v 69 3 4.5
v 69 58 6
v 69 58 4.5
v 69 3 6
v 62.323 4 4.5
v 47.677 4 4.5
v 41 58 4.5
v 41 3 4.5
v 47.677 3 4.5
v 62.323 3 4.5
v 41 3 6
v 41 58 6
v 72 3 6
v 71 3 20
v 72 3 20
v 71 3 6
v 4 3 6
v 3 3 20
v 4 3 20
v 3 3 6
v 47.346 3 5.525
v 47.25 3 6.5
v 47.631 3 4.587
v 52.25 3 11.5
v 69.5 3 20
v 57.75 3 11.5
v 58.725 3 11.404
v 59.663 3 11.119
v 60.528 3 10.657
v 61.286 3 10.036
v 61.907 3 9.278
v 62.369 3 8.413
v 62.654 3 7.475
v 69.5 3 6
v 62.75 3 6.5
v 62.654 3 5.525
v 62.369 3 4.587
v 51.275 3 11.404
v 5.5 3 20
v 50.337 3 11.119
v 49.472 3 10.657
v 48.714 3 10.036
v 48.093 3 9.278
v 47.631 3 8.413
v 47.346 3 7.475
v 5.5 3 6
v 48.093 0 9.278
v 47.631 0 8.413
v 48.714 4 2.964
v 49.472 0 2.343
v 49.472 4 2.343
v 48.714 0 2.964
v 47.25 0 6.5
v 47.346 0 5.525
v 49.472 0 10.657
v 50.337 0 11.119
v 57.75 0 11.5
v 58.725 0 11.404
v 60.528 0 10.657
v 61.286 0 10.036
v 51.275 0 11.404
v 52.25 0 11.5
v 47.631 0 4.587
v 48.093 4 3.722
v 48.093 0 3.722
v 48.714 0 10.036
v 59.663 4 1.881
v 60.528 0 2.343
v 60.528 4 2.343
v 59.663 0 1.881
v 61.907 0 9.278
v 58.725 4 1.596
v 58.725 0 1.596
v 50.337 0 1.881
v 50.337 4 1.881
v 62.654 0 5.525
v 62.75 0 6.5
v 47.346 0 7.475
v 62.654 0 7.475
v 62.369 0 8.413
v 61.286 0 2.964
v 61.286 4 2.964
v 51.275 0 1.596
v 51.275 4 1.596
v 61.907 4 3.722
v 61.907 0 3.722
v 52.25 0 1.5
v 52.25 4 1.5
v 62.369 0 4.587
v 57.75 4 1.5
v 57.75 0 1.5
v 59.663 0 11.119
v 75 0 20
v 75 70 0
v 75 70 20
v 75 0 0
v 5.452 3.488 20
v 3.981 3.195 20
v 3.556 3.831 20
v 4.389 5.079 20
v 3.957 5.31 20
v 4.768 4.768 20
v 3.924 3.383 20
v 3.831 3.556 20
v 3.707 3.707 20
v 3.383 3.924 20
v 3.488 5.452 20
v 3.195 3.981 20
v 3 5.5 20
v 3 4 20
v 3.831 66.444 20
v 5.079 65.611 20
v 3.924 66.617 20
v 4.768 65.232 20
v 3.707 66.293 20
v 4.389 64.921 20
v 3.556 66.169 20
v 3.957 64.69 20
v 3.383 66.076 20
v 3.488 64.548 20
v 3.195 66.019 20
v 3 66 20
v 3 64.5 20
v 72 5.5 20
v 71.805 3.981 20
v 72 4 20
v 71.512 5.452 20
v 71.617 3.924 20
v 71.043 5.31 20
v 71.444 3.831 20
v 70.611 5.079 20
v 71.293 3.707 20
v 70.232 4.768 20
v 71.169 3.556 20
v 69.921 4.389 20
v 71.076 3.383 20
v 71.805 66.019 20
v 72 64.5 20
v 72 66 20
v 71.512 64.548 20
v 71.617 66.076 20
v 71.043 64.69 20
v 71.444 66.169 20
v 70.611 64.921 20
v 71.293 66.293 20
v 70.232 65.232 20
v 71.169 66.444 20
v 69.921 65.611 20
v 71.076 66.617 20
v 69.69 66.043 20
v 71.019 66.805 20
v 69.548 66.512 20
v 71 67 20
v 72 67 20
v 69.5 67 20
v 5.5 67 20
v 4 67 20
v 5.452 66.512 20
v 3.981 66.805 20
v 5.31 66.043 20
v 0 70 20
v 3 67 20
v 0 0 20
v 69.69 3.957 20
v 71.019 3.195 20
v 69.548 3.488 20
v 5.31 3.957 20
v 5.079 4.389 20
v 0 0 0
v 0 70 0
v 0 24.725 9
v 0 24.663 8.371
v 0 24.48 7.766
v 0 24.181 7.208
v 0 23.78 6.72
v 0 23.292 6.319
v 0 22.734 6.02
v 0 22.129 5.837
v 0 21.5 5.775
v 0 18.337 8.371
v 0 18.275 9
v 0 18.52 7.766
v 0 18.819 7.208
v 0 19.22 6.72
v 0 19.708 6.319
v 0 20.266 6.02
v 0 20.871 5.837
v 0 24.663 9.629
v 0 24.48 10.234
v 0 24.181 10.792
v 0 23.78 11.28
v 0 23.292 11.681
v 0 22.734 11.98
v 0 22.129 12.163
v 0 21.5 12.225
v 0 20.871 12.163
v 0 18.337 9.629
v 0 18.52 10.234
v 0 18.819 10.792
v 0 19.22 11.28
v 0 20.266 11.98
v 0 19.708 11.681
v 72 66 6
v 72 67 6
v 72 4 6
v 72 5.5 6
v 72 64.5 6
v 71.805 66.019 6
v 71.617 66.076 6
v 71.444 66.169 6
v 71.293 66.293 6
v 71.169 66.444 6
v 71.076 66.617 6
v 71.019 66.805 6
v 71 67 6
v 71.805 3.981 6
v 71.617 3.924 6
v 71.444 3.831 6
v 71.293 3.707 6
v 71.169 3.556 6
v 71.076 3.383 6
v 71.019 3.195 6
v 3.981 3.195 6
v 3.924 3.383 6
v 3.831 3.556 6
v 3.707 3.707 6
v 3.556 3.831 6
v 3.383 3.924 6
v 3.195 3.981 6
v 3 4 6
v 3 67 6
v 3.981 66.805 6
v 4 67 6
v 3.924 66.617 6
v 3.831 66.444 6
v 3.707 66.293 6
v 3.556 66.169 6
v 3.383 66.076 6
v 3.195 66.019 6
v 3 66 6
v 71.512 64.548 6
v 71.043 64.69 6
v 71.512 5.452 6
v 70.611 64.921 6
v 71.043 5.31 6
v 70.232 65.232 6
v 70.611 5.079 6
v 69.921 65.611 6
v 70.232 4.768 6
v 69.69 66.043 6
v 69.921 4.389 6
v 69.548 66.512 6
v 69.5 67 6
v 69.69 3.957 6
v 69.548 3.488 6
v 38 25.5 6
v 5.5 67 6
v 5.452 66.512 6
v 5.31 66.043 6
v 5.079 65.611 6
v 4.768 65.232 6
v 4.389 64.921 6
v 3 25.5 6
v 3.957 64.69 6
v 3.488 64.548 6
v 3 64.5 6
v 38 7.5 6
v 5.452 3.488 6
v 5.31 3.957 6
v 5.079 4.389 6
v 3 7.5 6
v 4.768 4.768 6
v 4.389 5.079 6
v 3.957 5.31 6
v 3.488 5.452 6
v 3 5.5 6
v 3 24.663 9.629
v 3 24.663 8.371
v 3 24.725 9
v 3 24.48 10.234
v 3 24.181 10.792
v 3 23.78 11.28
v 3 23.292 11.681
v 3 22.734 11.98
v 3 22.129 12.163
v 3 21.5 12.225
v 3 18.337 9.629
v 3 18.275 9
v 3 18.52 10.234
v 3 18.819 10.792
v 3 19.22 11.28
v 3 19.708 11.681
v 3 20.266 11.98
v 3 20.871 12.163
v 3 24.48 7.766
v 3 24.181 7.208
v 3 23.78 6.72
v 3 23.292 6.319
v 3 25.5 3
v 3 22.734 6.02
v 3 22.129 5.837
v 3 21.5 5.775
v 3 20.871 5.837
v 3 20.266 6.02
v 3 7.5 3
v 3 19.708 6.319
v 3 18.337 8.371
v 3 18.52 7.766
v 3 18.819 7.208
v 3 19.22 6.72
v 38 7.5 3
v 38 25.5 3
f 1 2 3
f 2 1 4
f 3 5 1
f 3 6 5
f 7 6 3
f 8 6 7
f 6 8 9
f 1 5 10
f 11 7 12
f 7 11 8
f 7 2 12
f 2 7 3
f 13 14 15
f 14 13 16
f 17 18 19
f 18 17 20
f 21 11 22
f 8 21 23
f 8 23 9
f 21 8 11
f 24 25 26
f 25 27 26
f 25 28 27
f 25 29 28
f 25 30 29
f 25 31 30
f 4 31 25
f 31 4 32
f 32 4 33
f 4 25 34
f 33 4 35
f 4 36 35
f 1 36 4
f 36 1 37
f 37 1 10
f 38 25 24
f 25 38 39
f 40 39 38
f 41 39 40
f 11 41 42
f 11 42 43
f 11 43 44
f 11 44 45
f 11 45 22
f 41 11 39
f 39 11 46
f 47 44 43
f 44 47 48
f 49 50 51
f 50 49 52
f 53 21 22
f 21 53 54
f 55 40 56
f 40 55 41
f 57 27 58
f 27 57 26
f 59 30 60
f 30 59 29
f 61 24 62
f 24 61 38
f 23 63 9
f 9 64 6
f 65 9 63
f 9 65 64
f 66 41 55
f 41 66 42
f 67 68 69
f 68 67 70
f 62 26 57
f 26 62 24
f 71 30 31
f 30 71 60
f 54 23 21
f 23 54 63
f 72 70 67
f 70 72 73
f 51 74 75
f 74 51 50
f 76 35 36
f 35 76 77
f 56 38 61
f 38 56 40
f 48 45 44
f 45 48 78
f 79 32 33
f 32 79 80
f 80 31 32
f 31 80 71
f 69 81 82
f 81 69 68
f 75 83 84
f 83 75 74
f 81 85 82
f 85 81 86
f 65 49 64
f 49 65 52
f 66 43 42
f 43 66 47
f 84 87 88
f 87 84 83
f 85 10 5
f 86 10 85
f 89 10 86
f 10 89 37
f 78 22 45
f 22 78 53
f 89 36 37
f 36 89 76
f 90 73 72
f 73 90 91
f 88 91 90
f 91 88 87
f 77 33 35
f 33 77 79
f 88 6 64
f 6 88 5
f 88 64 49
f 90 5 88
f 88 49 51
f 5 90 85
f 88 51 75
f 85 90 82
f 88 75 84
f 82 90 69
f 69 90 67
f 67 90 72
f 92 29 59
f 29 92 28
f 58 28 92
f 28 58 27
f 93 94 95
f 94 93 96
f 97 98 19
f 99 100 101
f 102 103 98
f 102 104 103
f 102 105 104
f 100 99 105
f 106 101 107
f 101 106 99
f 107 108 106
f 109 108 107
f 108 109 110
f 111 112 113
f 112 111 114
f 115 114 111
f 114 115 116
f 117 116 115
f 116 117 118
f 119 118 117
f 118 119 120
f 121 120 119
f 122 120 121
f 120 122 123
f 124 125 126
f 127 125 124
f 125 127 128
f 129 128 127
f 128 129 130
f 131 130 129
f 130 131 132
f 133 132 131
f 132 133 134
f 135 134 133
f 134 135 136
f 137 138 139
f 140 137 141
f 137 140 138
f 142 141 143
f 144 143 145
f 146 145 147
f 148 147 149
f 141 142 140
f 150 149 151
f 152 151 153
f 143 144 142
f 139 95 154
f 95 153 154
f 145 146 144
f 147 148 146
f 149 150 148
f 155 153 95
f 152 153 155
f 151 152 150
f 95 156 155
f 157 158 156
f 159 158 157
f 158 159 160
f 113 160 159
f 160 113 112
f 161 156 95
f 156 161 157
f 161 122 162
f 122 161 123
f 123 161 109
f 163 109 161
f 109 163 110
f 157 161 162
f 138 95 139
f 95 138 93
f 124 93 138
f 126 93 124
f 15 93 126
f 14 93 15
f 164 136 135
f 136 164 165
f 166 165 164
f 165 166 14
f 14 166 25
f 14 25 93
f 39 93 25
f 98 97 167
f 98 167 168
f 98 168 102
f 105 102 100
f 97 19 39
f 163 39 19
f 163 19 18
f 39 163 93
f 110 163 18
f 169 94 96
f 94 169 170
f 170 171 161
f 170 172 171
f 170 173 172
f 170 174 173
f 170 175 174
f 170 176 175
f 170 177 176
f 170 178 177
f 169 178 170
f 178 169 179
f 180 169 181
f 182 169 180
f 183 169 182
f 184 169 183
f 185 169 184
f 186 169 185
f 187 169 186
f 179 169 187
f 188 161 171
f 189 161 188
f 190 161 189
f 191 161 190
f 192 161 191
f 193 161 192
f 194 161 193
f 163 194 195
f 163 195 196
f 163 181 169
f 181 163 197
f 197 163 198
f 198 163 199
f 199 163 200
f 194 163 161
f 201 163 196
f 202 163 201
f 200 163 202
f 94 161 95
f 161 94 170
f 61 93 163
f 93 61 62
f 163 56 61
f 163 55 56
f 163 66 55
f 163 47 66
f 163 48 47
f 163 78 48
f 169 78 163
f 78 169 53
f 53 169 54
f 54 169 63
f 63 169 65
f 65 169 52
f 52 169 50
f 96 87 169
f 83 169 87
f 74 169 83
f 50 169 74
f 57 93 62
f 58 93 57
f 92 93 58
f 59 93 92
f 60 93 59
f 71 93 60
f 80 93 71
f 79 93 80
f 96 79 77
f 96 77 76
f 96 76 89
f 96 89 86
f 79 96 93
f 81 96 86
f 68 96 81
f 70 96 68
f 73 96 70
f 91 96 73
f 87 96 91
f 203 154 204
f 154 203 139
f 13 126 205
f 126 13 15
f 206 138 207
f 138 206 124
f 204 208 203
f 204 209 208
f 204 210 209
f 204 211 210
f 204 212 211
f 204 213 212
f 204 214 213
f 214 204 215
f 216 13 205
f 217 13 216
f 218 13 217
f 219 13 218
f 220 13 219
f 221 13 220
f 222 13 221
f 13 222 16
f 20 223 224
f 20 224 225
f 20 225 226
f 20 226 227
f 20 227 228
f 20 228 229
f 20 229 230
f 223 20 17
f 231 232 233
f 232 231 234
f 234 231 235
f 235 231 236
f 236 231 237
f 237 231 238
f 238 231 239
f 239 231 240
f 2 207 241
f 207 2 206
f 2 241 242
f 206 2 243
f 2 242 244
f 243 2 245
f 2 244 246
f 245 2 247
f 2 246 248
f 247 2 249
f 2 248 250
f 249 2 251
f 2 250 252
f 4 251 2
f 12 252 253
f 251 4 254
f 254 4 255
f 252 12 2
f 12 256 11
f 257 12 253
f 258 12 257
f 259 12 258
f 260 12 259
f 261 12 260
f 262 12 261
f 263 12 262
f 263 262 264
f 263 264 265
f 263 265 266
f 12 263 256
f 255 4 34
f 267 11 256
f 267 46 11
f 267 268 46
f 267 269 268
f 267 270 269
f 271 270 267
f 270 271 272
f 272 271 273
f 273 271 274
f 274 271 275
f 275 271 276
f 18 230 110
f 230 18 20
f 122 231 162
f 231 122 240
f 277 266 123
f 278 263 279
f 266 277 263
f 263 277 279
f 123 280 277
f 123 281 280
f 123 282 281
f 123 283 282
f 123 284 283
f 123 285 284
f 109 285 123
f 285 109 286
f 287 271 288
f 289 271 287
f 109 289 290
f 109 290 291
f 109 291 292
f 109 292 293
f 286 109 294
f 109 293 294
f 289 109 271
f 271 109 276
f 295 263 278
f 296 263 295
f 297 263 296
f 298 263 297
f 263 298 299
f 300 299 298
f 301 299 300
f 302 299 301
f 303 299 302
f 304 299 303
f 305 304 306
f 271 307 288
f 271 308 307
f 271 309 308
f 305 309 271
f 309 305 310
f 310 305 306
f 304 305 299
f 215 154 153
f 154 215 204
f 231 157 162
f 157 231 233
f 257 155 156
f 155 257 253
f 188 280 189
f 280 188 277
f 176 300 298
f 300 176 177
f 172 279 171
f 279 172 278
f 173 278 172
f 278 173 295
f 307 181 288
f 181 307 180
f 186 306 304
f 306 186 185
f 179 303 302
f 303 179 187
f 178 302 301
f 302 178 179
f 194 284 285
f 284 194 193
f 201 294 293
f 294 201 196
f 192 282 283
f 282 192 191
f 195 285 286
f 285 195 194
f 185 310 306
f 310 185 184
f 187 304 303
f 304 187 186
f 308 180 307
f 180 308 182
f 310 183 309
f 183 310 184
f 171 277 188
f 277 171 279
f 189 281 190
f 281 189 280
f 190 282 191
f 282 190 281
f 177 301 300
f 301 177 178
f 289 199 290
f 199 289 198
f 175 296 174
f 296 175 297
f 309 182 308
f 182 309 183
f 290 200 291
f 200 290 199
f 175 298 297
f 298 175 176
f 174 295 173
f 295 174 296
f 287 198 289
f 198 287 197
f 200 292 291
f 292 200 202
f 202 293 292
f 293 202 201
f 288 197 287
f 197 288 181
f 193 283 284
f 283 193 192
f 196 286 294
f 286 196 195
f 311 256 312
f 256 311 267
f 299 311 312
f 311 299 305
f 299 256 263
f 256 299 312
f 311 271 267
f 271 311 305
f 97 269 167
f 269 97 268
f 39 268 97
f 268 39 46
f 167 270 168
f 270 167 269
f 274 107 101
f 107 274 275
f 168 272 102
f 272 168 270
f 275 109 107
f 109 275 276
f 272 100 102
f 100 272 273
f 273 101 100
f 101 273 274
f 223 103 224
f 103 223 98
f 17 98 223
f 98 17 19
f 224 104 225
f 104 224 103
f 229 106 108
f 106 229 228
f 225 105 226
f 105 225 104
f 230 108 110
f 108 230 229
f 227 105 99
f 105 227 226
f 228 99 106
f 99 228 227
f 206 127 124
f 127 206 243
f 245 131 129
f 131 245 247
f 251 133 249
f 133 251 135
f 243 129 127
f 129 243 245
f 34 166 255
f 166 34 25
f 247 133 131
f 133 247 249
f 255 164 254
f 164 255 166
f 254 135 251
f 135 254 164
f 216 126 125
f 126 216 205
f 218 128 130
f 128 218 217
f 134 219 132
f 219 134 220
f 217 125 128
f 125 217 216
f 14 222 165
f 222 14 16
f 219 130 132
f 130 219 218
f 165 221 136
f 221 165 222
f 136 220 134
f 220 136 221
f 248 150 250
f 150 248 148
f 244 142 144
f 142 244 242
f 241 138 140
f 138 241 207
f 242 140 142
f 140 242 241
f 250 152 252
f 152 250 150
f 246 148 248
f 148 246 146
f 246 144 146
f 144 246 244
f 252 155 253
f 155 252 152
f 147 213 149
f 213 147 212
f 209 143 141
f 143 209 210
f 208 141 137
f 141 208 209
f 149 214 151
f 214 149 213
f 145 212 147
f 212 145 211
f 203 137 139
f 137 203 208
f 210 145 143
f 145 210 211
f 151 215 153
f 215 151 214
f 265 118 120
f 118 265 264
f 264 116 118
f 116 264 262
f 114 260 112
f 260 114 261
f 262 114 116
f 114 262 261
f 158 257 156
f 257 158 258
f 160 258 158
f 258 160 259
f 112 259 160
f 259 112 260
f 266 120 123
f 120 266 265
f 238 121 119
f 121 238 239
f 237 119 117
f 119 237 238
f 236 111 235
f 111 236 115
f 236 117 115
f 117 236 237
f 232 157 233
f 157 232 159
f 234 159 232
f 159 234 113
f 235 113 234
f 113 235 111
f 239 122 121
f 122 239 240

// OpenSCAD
//r = 3.175;
//n = 10;
//$fn = r * cos(pi/n); apotema
$fn = 32;
union(){
difference(){
    
    union(){
        ///////CASE WALLS
        //case (+ 3 mm walls)
        cube([75,70,20]); 
        }
        
    //case cavity
    translate([3,3,6]) cube([69,64,21]);
    
    //SMA connector cavity
    translate([-5,21.5,9]) rotate([0,90,0]) 
    cylinder(h = 11.5,d = 6.45 );
    
    //DX-LR02 cavity
   translate([3,4+3.5,3])cube([35,18,6]);
    
    
    //ESP32 cavity
    translate([0,0,1.5])
        union(){
    translate([69-28,3,3])cube([28,55,6]);
    //USB-C cavity
    hull(){
        translate([69-(28/2)+2.75,4,5]) rotate([90,0,0]) cylinder(h=5,d=10);
        translate([69-(28/2)-2.75,4,5]) rotate([90,0,0]) cylinder(h=5,d=10);
        }
    }
}
    
//case-closing-screws turrets
        difference(){
        translate([3,3,6]) cylinder(h=14,d=5);
            #translate([3,3,6])cylinder(h=20,d=2);  //screw hole
        }
        difference(){
        translate([72,3,6]) cylinder(h=14,d=5);
            #translate([72,3,6])cylinder(h=20,d=2);
            
        }
        difference(){
        translate([72,67,6]) cylinder(h=14,d=5);              
            #translate([72,67,6])cylinder(h=20,d=2);
        }
        
        difference(){
        translate([3,67,6]) cylinder(h=14,d=5);
            #translate([3,67,6])cylinder(h=20,d=2);
            }

        }
    
